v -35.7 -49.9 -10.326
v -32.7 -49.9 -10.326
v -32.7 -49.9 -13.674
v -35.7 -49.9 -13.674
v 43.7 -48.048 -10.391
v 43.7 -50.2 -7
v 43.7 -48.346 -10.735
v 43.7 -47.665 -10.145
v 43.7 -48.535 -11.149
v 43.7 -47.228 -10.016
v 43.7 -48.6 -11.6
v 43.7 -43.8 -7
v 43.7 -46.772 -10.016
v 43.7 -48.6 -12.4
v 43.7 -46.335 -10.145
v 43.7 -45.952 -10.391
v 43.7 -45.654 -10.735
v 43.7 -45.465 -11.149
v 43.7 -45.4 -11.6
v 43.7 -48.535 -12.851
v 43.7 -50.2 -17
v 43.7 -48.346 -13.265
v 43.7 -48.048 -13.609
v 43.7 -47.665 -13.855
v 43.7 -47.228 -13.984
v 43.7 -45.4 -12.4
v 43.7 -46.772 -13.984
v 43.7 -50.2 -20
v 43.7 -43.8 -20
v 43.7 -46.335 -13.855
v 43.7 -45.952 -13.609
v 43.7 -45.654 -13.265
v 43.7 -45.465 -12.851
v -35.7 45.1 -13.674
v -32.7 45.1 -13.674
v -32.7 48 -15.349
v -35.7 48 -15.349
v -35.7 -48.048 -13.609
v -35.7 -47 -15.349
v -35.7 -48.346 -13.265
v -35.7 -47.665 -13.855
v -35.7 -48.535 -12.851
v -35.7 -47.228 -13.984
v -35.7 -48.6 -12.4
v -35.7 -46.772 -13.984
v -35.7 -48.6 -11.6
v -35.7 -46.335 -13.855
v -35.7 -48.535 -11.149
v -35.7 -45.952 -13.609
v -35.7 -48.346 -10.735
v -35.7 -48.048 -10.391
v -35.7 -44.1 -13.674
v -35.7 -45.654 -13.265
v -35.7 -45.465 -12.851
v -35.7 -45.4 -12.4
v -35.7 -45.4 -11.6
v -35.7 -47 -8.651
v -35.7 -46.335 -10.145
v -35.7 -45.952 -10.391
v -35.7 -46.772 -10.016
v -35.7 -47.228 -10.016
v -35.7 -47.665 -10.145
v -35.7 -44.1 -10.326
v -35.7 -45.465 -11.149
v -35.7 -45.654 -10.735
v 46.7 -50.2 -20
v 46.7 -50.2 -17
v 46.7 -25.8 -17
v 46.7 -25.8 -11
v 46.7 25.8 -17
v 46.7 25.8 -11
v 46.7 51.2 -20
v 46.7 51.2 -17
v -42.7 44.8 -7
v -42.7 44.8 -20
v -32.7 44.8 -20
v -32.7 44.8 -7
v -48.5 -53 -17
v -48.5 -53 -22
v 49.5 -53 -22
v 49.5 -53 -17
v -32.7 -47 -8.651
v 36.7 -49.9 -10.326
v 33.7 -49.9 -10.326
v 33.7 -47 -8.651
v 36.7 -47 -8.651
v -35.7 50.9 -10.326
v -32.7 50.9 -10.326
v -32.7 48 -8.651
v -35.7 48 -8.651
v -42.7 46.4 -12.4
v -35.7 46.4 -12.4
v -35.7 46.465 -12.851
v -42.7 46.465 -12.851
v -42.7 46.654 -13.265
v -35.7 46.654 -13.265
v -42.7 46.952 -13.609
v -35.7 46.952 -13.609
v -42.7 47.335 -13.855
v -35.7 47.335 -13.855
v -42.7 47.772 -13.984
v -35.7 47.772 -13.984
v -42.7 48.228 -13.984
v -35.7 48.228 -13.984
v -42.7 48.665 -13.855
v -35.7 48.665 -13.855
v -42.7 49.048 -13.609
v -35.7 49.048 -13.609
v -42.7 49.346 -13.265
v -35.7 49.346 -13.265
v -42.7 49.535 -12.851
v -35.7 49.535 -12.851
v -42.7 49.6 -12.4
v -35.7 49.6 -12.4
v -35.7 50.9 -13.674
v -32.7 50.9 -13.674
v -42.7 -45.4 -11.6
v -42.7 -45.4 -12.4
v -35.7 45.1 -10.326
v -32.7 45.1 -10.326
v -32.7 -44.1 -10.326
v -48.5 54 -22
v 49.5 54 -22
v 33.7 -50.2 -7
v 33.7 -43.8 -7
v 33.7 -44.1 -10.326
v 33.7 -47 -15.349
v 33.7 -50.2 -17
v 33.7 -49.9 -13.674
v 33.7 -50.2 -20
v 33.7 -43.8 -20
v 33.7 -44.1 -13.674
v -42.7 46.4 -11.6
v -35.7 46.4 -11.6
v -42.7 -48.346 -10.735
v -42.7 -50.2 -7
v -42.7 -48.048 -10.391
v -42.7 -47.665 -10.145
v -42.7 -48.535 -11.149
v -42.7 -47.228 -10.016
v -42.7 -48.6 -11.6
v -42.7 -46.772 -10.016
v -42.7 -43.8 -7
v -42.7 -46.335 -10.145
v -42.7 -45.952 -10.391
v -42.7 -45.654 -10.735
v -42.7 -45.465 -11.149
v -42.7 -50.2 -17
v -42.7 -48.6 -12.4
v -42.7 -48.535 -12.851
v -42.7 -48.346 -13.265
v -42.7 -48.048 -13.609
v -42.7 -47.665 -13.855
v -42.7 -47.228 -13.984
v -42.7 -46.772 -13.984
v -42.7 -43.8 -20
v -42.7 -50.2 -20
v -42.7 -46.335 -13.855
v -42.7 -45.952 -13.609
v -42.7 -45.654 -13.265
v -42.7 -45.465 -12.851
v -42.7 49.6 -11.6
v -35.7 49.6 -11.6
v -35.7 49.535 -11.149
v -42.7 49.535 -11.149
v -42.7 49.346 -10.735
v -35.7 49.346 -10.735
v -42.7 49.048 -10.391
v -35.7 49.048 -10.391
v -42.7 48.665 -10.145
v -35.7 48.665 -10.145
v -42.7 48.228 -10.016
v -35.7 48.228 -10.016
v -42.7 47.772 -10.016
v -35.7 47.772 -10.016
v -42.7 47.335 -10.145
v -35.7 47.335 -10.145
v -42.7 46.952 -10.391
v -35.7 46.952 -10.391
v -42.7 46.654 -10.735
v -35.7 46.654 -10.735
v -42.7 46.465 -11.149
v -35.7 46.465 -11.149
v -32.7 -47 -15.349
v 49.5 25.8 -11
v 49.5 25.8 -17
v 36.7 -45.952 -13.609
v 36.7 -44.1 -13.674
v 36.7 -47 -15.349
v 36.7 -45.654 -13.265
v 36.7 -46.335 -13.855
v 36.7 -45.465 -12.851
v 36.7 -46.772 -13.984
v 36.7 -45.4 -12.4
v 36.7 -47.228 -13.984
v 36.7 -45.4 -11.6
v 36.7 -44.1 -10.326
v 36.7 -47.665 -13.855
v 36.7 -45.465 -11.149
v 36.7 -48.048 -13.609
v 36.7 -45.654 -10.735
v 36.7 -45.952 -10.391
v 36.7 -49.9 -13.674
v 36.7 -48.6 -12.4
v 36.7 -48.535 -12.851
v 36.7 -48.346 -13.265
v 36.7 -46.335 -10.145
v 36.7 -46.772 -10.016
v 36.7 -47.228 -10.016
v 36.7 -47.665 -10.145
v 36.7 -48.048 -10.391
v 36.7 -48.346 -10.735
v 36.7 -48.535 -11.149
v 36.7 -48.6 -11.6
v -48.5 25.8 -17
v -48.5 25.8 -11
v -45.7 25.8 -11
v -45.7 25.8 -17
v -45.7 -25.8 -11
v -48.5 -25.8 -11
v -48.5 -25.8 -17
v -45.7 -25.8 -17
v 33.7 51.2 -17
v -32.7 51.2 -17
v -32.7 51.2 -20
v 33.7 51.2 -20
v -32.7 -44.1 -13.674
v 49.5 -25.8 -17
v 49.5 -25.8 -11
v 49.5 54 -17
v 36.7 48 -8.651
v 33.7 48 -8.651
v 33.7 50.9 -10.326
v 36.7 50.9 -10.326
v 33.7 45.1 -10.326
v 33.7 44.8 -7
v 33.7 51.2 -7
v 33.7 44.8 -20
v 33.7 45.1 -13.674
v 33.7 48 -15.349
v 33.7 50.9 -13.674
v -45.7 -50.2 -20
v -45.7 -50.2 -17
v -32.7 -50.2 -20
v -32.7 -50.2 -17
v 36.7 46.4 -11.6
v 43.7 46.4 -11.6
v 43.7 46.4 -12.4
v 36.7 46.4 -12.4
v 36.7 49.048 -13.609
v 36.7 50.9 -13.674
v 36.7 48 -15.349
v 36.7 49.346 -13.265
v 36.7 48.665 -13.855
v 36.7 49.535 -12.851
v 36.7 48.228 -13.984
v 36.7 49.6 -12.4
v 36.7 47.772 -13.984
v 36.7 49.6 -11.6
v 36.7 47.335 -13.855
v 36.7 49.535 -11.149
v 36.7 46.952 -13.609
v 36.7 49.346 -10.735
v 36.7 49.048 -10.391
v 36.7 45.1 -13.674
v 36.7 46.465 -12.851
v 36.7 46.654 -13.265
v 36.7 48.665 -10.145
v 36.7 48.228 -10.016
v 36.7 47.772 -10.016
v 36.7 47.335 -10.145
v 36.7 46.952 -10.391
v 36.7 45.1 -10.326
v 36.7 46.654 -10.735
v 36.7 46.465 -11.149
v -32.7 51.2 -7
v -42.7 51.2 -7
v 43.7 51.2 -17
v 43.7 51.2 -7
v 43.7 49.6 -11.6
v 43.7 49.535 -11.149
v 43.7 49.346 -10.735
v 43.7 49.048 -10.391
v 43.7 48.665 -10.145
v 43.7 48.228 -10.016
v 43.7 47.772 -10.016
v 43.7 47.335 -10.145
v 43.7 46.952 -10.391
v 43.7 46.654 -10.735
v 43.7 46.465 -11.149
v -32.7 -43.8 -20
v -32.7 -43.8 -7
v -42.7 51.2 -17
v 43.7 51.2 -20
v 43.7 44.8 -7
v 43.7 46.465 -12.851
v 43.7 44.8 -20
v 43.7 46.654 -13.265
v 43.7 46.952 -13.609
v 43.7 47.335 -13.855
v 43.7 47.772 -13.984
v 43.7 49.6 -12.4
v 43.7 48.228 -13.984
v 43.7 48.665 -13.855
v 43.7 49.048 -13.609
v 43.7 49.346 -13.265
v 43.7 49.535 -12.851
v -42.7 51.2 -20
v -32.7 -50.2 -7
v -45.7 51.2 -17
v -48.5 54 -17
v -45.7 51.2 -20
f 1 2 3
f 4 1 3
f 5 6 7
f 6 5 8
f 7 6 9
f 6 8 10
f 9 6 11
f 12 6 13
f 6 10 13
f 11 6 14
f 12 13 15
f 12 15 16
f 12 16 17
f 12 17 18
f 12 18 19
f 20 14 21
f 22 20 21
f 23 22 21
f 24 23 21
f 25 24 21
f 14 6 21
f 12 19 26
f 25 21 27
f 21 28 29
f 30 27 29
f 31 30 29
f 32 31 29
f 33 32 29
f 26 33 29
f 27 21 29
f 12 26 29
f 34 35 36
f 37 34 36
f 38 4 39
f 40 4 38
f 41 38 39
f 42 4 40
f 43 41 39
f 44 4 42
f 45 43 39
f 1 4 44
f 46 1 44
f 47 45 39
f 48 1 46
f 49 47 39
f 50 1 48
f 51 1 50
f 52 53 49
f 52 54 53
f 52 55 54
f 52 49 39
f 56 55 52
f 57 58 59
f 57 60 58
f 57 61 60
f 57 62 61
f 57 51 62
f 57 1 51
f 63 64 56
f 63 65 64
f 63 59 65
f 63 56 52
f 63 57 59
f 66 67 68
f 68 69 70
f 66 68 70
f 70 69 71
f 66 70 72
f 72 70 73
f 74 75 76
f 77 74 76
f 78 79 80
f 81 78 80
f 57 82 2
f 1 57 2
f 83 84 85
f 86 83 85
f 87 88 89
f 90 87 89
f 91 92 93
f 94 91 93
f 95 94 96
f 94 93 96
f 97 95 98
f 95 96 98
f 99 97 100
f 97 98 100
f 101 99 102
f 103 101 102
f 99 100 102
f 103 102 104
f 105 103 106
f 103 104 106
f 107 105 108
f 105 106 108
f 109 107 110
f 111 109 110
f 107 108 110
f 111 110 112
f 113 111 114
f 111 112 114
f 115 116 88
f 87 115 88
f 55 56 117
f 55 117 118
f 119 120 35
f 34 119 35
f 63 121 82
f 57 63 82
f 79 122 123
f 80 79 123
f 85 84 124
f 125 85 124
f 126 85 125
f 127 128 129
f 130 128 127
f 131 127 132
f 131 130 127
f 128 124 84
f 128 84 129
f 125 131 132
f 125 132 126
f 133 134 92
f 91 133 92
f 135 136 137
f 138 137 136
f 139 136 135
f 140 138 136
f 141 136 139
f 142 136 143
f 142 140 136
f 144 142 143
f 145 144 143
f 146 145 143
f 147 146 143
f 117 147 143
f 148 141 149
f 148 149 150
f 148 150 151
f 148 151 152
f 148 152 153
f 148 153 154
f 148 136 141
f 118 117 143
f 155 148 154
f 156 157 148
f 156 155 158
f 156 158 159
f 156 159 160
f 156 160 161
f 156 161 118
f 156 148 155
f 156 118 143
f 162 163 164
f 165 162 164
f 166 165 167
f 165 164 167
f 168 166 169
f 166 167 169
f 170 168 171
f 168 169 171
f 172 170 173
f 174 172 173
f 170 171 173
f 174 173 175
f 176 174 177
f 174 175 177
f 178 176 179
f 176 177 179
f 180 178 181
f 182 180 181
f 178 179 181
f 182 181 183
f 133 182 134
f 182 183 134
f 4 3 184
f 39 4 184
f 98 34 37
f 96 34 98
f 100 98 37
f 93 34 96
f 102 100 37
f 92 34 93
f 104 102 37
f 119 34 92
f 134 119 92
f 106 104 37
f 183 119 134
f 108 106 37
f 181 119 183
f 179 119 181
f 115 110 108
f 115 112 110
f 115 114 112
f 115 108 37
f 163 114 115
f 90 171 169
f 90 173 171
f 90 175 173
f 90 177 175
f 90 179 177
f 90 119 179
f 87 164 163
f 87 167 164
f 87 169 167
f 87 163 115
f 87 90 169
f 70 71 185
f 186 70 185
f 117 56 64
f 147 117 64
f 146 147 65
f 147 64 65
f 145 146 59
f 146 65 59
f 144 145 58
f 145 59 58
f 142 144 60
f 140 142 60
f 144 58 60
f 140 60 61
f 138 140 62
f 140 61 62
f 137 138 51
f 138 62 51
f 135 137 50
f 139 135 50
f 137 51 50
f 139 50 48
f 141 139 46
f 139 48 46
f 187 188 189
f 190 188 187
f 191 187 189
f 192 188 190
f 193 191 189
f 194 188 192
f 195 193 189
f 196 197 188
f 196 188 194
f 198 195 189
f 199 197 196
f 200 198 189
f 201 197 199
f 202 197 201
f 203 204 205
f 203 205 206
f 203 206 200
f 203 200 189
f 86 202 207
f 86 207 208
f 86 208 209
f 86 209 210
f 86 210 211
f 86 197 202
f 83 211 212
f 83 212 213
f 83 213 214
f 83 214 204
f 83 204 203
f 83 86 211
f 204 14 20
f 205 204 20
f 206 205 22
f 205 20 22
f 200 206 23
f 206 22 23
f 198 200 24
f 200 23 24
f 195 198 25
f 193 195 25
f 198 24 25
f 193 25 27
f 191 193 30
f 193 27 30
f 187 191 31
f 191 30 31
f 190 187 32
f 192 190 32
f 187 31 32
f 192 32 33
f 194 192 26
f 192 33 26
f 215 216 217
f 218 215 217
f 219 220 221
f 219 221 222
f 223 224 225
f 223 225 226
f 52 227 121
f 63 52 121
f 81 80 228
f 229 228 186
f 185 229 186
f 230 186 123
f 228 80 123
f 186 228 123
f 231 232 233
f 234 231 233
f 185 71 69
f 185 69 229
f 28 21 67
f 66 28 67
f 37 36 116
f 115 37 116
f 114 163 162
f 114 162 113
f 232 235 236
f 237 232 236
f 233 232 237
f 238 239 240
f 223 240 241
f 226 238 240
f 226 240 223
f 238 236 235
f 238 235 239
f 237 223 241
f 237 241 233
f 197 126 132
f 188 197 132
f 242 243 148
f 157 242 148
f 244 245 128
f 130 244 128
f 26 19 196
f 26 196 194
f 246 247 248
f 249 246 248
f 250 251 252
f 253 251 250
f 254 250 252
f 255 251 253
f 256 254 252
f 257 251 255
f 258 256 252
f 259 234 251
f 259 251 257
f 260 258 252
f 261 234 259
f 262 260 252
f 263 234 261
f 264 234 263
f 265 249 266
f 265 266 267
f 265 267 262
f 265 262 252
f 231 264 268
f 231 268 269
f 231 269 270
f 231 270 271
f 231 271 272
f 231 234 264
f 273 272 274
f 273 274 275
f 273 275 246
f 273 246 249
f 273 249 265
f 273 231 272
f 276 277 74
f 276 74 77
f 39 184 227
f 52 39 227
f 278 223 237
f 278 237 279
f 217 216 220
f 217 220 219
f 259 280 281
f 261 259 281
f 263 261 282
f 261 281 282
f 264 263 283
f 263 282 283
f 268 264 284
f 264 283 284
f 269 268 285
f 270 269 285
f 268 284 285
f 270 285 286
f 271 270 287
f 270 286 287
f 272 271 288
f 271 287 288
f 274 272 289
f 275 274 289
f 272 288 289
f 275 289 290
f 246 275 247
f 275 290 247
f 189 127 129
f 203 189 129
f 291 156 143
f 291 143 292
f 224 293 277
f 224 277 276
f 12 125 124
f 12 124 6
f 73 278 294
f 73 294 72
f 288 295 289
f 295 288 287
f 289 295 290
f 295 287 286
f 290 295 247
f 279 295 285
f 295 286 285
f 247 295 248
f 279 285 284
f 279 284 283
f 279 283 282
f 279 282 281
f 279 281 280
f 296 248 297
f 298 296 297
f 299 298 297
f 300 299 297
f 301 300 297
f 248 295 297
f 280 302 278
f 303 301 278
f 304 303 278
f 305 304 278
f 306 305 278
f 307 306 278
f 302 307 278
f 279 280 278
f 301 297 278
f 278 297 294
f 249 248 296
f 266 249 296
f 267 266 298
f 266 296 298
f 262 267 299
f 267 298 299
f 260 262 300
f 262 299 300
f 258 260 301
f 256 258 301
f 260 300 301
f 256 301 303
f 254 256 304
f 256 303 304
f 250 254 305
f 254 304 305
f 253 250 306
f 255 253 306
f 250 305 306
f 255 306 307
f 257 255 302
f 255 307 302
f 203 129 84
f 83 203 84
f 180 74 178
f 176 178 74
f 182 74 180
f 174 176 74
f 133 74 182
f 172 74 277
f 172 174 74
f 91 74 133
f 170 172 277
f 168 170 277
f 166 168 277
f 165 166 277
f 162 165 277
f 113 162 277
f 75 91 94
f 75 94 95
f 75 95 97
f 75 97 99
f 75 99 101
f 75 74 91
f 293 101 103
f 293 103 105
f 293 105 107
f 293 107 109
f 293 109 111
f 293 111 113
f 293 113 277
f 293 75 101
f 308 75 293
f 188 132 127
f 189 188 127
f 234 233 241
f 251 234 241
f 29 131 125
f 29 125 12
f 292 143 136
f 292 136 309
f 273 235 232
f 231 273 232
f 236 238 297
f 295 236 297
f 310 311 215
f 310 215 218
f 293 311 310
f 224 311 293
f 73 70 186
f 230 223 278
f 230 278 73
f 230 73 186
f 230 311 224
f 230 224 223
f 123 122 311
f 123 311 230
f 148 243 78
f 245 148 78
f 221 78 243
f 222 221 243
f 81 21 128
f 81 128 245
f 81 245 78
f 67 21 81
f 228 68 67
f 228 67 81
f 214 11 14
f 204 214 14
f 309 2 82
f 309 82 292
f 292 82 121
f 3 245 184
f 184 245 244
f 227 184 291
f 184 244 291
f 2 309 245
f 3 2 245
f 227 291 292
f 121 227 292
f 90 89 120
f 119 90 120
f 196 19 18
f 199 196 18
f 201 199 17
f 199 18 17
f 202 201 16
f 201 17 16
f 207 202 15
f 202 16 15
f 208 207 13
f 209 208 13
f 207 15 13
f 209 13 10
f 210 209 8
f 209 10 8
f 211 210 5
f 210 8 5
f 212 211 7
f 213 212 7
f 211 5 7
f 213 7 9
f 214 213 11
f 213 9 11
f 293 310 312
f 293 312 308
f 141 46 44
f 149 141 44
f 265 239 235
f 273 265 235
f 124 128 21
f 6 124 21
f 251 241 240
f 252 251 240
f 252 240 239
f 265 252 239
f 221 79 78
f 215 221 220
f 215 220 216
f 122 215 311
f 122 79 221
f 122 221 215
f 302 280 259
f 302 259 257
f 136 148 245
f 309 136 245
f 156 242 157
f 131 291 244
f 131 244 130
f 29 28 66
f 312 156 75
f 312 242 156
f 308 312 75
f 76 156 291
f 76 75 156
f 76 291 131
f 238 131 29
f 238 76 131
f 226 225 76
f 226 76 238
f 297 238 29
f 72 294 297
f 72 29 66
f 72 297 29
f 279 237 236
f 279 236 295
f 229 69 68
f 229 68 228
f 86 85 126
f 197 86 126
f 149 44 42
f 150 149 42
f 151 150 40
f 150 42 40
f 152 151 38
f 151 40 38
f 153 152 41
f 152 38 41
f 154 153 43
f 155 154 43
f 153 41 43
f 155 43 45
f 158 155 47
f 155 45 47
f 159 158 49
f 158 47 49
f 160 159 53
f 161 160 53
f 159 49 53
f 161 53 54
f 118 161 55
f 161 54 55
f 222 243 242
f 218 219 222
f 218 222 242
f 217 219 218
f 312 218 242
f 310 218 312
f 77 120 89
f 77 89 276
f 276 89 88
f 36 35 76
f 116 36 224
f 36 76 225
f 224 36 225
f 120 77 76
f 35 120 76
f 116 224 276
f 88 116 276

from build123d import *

# Parameters (mm, degrees)
SKETCH017_W     = 98
SKETCH017_H     = 107
PAD015_DEPTH    = 5
SKETCH018_W     = 92.4
SKETCH018_H     = 101.4
POCKET_DEPTH    = 3
SKETCH019_W     = 2.8
SKETCH019_H     = 51.6
PAD016_DEPTH    = 6
SKETCH020_W     = 10
SKETCH020_H     = 6.4
PAD017_DEPTH    = 13
POCKET001_DEPTH = 92.201
POCKET019_DEPTH = 3
POCKET020_DEPTH = 3


with BuildPart() as part:
    # Sketch017 → Pad015 (new body)
    with BuildSketch(Plane.XY.offset(-22)):
        with Locations((0.5, 0.5)):
            Rectangle(SKETCH017_W, SKETCH017_H)
    extrude(amount=PAD015_DEPTH)

    # Sketch018 (on Face6 of Pad015) → Pocket (cut)
    with BuildSketch(Plane.XY.offset(-17)):
        with Locations((0.5, 0.5)):
            Rectangle(SKETCH018_W, SKETCH018_H)
    extrude(amount=-POCKET_DEPTH, mode=Mode.SUBTRACT)

    # Sketch019 (on Face5 of Pocket) → Pad016 (join)
    with BuildSketch(Plane.XY.offset(-17)):
        with Locations((-47.1, 0)):
            Rectangle(SKETCH019_W, SKETCH019_H)
        with Locations((48.1, 0)):
            Rectangle(SKETCH019_W, SKETCH019_H)
    extrude(amount=PAD016_DEPTH)

    # Sketch020 (on Face21 of Pad016) → Pad017 (join)
    with BuildSketch(Plane.XY.offset(-20)):
        with Locations((-37.7, 48)):
            Rectangle(SKETCH020_W, SKETCH020_H)
        with Locations((38.7, 48)):
            Rectangle(SKETCH020_W, SKETCH020_H)
        with Locations((-37.7, -47)):
            Rectangle(SKETCH020_W, SKETCH020_H)
        with Locations((38.7, -47)):
            Rectangle(SKETCH020_W, SKETCH020_H)
    extrude(amount=PAD017_DEPTH)

    # Sketch021 (on Face37 of Pad017) → Pocket001 (cut, through all)
    with BuildSketch(Plane.YZ.offset(43.7)):
        with BuildLine():
            ThreePointArc((-45.4, -11.6), (-47, -10), (-48.6, -11.6))
            Line((-48.6, -11.6), (-48.6, -12.4))
            ThreePointArc((-48.6, -12.4), (-47, -14), (-45.4, -12.4))
            Line((-45.4, -11.6), (-45.4, -12.4))
        make_face()
        with BuildLine():
            ThreePointArc((49.6, -11.6), (48, -10), (46.4, -11.6))
            Line((46.4, -11.6), (46.4, -12.4))
            ThreePointArc((46.4, -12.4), (48, -14), (49.6, -12.4))
            Line((49.6, -11.6), (49.6, -12.4))
        make_face()
    extrude(amount=-POCKET001_DEPTH, mode=Mode.SUBTRACT)

    # Sketch055 (on Face40 of Pocket001) → Pocket019 (cut)
    with BuildSketch(Plane.YZ.offset(-32.7)):
        Polygon((-49.9, -13.674316), (-47, -15.348632), (-44.1, -13.674316), (-44.1, -10.325684), (-47, -8.651368), (-49.9, -10.325684), align=None)
        Polygon((48, -15.348632), (50.9, -13.674316), (50.9, -10.325684), (48, -8.651368), (45.1, -10.325684), (45.1, -13.674316), align=None)
    extrude(amount=-POCKET019_DEPTH, mode=Mode.SUBTRACT)

    # Sketch056 (on Face39 of Pocket019) → Pocket020 (cut)
    with BuildSketch(Plane(origin=(33.7, 0, 0), x_dir=(0, -1, 0), z_dir=(-1, 0, 0))):
        Polygon((47, -15.348632), (49.9, -13.674316), (49.9, -10.325684), (47, -8.651368), (44.1, -10.325684), (44.1, -13.674316), align=None)
        Polygon((-45.1, -13.674316), (-45.1, -10.325684), (-48, -8.651368), (-50.9, -10.325684), (-50.9, -13.674316), (-48, -15.348632), align=None)
    extrude(amount=-POCKET020_DEPTH, mode=Mode.SUBTRACT)


solid = part.part
